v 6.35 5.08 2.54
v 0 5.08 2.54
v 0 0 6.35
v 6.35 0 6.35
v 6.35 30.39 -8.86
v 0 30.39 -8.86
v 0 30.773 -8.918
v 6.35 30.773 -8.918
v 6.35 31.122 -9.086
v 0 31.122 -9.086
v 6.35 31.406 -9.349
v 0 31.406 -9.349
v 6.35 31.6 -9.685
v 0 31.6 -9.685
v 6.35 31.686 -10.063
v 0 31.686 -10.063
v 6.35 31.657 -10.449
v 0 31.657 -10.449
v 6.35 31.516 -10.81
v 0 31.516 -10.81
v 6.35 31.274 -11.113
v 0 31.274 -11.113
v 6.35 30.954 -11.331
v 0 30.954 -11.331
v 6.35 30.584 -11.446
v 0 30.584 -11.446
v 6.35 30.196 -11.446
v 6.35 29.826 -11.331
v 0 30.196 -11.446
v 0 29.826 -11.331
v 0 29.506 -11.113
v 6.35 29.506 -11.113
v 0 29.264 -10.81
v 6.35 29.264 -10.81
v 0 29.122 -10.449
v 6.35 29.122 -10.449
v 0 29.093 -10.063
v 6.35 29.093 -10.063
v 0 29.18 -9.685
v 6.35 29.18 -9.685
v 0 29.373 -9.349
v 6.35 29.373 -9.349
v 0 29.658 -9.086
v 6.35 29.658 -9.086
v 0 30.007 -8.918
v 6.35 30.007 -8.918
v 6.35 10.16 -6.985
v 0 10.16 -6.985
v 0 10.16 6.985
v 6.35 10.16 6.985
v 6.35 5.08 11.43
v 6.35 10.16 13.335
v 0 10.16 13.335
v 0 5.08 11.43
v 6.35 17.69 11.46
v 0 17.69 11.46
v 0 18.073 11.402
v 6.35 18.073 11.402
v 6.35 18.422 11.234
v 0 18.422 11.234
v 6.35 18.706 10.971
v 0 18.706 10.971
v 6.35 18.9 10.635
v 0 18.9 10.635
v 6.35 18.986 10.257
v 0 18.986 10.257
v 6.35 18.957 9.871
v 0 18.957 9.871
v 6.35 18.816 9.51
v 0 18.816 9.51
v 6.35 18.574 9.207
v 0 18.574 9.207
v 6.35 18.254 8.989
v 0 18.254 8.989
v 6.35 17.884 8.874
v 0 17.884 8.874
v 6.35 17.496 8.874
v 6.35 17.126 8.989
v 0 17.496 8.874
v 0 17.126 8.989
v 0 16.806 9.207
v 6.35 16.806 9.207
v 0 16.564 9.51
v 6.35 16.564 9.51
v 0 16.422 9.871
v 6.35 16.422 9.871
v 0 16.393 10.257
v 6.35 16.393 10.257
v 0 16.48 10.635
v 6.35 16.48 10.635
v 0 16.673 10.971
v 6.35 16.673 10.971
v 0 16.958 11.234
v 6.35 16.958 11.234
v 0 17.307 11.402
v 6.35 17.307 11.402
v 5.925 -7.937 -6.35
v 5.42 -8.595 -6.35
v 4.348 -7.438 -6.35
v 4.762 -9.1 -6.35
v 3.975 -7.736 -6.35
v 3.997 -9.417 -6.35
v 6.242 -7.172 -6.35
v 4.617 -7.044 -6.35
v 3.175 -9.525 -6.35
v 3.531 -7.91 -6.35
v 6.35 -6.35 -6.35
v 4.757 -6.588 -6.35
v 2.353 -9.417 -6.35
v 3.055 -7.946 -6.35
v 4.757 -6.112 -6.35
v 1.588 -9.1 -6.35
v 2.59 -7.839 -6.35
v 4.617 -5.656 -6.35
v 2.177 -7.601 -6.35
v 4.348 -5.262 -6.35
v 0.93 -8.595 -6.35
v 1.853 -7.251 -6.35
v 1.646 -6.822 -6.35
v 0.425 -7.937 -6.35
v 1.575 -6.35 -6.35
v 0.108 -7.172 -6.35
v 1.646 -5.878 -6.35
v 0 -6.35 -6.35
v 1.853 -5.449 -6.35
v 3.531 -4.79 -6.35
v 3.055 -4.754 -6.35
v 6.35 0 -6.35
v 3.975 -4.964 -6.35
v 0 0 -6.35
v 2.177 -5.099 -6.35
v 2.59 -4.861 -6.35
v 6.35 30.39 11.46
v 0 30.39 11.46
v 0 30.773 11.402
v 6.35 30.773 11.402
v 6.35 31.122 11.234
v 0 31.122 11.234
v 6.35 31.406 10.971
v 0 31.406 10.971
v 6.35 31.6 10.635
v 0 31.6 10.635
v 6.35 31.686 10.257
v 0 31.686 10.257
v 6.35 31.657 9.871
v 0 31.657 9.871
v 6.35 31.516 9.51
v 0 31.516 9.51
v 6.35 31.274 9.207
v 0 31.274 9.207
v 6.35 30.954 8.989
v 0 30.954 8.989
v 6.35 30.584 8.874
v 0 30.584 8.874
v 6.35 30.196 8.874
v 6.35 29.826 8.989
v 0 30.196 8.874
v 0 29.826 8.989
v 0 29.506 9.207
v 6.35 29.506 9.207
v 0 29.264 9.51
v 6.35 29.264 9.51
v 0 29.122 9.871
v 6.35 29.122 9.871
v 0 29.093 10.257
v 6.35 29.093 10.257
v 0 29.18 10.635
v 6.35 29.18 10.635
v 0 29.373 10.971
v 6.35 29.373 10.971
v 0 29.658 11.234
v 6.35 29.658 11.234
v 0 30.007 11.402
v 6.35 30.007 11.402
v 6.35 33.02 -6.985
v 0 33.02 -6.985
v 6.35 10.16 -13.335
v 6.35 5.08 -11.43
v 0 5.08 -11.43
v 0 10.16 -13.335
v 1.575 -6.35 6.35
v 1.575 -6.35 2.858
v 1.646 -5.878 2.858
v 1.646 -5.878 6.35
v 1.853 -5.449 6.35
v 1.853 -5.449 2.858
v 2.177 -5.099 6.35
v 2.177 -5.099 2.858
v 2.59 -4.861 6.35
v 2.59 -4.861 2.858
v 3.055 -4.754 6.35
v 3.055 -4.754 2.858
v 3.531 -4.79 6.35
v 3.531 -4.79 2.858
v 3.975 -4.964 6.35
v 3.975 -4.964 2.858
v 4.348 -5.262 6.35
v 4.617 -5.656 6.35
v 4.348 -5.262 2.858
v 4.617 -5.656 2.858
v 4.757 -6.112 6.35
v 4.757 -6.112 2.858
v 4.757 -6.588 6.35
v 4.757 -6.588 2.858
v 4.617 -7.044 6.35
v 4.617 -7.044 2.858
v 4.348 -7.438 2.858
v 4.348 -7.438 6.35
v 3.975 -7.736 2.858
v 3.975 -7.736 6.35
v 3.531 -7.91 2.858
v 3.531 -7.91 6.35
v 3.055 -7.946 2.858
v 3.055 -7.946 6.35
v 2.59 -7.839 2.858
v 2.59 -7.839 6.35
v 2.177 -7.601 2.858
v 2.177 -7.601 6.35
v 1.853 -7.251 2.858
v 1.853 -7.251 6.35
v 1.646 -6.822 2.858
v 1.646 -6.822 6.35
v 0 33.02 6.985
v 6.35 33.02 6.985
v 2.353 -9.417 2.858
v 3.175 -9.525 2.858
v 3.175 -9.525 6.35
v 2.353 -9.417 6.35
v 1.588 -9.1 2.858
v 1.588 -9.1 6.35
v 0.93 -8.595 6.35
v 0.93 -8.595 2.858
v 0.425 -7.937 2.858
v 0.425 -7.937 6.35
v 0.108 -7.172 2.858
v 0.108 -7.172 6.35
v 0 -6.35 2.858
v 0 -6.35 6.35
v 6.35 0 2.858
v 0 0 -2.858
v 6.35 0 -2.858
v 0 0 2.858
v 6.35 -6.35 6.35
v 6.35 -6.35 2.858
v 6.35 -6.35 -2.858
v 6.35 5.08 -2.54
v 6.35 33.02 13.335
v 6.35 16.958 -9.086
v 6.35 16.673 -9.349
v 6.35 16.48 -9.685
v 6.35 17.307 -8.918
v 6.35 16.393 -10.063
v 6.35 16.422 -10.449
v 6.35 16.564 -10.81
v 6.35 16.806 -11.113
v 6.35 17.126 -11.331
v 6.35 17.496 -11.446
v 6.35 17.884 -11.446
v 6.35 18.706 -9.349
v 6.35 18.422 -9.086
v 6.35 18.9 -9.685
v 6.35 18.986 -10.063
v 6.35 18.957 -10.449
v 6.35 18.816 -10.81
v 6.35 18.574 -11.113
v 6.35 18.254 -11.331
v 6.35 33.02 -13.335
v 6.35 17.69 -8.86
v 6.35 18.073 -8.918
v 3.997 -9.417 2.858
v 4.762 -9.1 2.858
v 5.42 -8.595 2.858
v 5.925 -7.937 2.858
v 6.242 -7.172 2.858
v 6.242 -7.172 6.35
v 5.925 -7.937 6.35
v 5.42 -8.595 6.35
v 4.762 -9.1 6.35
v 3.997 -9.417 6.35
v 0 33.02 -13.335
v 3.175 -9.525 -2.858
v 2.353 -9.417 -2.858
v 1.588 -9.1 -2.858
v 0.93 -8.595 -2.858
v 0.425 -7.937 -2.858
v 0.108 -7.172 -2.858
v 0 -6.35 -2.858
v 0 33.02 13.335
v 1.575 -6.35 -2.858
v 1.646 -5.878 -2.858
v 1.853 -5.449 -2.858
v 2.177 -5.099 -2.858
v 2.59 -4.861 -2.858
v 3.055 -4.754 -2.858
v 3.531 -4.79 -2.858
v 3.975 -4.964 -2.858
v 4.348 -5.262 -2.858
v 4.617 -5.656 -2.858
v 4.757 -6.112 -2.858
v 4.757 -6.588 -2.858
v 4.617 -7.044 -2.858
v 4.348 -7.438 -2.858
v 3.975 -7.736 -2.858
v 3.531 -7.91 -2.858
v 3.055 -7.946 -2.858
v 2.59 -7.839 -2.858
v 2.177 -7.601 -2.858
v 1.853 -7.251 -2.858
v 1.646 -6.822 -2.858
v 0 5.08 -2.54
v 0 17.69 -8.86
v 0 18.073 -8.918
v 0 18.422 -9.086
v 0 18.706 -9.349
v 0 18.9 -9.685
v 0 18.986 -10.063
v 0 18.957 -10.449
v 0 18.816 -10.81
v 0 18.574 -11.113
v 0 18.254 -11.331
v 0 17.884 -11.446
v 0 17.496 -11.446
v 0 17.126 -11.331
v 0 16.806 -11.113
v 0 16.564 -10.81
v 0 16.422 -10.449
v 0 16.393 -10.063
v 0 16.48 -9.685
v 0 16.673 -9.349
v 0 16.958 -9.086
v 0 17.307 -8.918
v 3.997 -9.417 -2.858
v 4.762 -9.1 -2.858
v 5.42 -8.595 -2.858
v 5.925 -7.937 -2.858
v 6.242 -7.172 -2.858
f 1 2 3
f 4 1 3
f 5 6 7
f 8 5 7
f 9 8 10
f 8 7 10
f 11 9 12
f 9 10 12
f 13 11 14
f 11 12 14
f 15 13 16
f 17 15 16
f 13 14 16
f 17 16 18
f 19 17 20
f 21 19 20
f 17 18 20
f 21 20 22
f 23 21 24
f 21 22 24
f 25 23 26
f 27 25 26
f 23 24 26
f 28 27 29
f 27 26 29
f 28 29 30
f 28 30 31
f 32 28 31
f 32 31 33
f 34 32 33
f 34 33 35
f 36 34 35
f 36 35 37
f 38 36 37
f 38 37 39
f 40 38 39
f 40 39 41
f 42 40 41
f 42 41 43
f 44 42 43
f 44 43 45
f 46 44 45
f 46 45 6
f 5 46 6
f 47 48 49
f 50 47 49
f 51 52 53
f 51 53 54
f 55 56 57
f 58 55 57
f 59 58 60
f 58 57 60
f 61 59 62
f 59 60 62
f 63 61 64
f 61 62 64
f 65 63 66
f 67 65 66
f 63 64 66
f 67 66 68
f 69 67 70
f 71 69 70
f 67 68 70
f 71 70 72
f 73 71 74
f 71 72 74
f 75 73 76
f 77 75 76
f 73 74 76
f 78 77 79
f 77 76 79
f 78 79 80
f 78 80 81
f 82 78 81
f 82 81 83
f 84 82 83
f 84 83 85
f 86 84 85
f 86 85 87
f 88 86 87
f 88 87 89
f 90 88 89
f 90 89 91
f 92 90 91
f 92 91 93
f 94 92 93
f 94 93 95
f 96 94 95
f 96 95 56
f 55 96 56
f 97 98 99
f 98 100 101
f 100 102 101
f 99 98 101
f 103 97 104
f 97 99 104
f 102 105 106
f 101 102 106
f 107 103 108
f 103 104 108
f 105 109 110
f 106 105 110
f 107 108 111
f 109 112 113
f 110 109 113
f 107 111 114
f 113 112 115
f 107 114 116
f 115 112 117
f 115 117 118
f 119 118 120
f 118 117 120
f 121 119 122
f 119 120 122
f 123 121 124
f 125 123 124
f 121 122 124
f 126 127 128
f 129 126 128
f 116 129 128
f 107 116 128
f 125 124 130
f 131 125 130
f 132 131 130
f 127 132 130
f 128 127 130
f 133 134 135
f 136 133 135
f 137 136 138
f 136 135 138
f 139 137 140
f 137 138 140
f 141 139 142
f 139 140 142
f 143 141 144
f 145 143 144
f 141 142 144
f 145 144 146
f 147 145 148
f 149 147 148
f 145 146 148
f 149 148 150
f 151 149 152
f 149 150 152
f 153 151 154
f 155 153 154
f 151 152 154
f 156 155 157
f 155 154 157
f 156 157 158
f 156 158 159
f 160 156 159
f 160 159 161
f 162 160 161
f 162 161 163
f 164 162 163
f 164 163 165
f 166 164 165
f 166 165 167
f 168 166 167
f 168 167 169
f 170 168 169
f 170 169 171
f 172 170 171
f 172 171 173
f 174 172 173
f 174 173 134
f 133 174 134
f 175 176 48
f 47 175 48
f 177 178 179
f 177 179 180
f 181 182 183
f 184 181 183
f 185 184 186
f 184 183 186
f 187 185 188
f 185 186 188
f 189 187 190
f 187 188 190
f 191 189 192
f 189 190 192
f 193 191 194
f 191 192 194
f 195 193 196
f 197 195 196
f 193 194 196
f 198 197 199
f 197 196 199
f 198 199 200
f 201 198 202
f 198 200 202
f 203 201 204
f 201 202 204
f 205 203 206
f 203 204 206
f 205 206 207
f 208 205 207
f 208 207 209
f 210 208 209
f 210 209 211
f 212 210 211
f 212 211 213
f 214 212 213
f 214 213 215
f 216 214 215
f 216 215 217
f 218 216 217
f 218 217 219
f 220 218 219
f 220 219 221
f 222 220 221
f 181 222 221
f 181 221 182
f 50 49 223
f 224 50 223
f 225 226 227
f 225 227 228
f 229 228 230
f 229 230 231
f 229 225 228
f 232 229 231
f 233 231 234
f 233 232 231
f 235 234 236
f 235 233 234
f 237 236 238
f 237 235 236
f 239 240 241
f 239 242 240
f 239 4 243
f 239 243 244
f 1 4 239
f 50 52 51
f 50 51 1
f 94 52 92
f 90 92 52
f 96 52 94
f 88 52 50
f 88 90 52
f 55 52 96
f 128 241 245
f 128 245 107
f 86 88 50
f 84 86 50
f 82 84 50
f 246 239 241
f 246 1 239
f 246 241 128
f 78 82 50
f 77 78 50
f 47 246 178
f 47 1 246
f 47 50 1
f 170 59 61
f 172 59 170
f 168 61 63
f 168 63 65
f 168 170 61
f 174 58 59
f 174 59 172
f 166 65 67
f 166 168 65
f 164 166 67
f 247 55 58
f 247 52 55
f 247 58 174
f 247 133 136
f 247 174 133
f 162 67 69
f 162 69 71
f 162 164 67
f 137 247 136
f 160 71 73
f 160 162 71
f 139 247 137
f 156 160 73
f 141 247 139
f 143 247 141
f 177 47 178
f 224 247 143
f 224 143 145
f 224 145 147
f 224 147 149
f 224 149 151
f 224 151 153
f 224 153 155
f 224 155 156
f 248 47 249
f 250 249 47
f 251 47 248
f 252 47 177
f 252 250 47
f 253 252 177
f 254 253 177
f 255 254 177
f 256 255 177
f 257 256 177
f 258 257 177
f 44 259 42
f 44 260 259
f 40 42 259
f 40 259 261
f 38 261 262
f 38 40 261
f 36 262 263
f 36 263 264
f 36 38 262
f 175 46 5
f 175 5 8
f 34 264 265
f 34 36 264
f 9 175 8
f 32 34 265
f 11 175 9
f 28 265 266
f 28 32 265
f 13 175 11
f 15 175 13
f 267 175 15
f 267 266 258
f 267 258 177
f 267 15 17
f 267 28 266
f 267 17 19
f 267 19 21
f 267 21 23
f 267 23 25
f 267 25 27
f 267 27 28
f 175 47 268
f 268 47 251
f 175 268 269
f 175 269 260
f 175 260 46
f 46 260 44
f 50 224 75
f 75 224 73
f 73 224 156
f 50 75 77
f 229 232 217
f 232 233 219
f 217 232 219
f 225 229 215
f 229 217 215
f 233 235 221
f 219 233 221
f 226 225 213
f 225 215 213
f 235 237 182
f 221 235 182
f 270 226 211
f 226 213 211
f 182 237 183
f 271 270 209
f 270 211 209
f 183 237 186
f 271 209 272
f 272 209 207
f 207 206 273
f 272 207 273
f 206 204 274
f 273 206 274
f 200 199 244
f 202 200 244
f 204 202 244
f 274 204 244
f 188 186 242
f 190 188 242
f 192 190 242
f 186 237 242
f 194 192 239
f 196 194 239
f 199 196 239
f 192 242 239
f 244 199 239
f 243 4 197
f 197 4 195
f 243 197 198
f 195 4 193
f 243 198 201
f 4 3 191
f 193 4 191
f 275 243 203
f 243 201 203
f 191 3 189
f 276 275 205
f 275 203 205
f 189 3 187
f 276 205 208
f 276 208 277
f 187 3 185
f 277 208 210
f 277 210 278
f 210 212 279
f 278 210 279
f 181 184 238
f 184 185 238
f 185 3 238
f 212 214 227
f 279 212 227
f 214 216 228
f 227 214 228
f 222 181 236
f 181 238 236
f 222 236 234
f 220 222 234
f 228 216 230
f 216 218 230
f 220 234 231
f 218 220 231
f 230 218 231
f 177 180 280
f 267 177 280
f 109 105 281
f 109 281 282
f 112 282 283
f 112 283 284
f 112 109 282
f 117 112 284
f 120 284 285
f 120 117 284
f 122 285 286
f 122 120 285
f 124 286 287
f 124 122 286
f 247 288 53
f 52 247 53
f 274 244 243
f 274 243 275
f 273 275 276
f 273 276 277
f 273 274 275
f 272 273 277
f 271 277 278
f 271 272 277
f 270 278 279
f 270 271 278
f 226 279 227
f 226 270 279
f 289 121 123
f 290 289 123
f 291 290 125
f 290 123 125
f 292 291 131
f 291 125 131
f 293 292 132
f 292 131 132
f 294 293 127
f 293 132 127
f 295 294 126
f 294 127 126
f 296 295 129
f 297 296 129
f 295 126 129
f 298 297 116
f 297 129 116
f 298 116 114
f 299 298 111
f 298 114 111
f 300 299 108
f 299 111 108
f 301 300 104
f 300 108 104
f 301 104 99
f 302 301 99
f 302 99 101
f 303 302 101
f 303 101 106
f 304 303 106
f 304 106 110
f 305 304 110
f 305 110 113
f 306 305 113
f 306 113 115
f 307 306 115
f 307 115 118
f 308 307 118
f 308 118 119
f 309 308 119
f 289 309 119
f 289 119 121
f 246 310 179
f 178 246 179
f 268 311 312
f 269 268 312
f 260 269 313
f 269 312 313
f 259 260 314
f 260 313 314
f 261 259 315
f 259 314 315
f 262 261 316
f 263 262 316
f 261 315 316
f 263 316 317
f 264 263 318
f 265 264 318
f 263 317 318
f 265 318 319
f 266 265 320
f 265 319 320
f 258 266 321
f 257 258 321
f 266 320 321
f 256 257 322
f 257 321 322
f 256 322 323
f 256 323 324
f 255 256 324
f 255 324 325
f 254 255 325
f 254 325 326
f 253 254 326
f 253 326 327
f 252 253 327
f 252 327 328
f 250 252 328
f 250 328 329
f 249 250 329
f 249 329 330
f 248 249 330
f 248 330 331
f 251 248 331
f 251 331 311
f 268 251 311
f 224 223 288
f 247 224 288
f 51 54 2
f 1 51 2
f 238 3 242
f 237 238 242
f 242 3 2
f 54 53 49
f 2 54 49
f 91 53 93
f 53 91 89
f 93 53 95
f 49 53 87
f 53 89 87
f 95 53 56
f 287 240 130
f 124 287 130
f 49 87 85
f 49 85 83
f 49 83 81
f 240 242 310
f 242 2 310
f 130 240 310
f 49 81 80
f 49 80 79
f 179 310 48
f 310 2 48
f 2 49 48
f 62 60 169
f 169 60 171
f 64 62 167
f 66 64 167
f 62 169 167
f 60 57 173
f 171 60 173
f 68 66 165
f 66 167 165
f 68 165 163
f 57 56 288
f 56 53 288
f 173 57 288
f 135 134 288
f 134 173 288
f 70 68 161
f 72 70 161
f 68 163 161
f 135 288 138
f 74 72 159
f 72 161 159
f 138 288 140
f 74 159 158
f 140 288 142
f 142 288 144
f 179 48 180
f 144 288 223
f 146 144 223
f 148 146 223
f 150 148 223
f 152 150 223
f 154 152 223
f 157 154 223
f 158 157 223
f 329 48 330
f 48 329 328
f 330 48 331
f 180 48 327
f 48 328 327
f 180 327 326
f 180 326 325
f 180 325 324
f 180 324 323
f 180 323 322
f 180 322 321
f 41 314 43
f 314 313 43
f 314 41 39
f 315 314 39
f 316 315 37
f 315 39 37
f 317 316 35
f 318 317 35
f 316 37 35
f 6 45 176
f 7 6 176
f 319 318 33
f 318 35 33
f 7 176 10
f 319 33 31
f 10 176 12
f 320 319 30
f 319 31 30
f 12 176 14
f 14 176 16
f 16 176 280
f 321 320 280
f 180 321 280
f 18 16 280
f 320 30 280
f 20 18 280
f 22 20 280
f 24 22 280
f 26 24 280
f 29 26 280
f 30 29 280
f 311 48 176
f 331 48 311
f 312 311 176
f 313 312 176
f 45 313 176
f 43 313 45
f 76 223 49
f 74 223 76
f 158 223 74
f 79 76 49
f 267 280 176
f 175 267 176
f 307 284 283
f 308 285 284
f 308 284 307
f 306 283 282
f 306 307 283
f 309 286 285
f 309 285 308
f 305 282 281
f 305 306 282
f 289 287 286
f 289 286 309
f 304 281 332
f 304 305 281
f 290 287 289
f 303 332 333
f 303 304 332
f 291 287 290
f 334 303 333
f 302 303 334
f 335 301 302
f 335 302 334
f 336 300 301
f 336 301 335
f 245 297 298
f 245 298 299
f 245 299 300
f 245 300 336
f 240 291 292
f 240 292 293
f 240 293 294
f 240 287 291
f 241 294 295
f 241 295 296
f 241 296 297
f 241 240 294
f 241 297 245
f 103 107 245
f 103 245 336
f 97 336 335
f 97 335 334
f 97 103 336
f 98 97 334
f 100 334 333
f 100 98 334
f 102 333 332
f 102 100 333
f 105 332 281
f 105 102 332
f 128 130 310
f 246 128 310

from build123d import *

# Parameters (mm, degrees)
BOSS_EXTRUDE2_DEPTH  = 6.35
CUT_EXTRUDE1_START   = -12.7
CUT_EXTRUDE1_DEPTH   = 12.7
SKETCH17_W           = 6.35
SKETCH17_H           = 9.525
CUT_EXTRUDE2_DEPTH   = 2.8575
M2_CLEARANCE_HOLE1_D = 2.6
M3_CLEARANCE_HOLE1_D = 3.2


with BuildPart() as part:
    # Sketch5 → Boss-Extrude2 (new body)
    with BuildSketch(Plane(origin=(0, 0, 0), x_dir=(0, 0, -1), z_dir=(1, 0, 0))):
        Polygon((-11.43, 5.08), (-2.54, 5.08), (-6.35, 0), (-6.35, -9.525), (6.35, -9.525), (6.35, 0), (2.54, 5.08), (11.43, 5.08), (13.335, 10.16), (13.335, 33.02), (6.985, 33.02), (6.985, 10.16), (-6.985, 10.16), (-6.985, 33.02), (-13.335, 33.02), (-13.335, 10.16), align=None)
    extrude(amount=BOSS_EXTRUDE2_DEPTH)

    # Cut-Extrude1: read off the stored shape, not the designer's step
    # Cut-Extrude1 outline → Cut-Extrude1 (cut)
    with BuildSketch(Plane.XY.offset(6.35).offset(CUT_EXTRUDE1_START)):
        with BuildLine():
            Line((6.35, -9.525), (6.35, -6.35))
            ThreePointArc((6.35, -6.35), (5.42006403, -8.59506403), (3.175, -9.525))
            Line((3.175, -9.525), (6.35, -9.525))
        make_face()
        with BuildLine():
            Line((0, -9.525), (3.175, -9.525))
            ThreePointArc((3.175, -9.525), (0.92993597, -8.59506403), (0, -6.35))
            Line((0, -6.35), (0, -9.525))
        make_face()
    extrude(amount=CUT_EXTRUDE1_DEPTH, mode=Mode.SUBTRACT)

    # Sketch17 → Cut-Extrude2 (cut, symmetric)
    with BuildSketch(Plane.XY):
        with Locations((3.175, -4.7625)):
            Rectangle(SKETCH17_W, SKETCH17_H)
    extrude(amount=CUT_EXTRUDE2_DEPTH, both=True, mode=Mode.SUBTRACT)

    # M2 Clearance Hole1 (through all)
    with Locations(Plane(origin=(6.35, 0, 0), x_dir=(0, 0, -1), z_dir=(1, 0, 0))):
        with Locations((-10.159977629, 17.689823395), (-10.159977629, 30.389823395), (10.160022371, 30.389823395), (10.160022371, 17.689823395)):
            Hole(M2_CLEARANCE_HOLE1_D / 2)

    # M3 Clearance Hole1 (through all)
    with Locations(Plane.XY.offset(6.35)):
        with Locations((3.175, -6.35)):
            Hole(M3_CLEARANCE_HOLE1_D / 2)


solid = part.part
